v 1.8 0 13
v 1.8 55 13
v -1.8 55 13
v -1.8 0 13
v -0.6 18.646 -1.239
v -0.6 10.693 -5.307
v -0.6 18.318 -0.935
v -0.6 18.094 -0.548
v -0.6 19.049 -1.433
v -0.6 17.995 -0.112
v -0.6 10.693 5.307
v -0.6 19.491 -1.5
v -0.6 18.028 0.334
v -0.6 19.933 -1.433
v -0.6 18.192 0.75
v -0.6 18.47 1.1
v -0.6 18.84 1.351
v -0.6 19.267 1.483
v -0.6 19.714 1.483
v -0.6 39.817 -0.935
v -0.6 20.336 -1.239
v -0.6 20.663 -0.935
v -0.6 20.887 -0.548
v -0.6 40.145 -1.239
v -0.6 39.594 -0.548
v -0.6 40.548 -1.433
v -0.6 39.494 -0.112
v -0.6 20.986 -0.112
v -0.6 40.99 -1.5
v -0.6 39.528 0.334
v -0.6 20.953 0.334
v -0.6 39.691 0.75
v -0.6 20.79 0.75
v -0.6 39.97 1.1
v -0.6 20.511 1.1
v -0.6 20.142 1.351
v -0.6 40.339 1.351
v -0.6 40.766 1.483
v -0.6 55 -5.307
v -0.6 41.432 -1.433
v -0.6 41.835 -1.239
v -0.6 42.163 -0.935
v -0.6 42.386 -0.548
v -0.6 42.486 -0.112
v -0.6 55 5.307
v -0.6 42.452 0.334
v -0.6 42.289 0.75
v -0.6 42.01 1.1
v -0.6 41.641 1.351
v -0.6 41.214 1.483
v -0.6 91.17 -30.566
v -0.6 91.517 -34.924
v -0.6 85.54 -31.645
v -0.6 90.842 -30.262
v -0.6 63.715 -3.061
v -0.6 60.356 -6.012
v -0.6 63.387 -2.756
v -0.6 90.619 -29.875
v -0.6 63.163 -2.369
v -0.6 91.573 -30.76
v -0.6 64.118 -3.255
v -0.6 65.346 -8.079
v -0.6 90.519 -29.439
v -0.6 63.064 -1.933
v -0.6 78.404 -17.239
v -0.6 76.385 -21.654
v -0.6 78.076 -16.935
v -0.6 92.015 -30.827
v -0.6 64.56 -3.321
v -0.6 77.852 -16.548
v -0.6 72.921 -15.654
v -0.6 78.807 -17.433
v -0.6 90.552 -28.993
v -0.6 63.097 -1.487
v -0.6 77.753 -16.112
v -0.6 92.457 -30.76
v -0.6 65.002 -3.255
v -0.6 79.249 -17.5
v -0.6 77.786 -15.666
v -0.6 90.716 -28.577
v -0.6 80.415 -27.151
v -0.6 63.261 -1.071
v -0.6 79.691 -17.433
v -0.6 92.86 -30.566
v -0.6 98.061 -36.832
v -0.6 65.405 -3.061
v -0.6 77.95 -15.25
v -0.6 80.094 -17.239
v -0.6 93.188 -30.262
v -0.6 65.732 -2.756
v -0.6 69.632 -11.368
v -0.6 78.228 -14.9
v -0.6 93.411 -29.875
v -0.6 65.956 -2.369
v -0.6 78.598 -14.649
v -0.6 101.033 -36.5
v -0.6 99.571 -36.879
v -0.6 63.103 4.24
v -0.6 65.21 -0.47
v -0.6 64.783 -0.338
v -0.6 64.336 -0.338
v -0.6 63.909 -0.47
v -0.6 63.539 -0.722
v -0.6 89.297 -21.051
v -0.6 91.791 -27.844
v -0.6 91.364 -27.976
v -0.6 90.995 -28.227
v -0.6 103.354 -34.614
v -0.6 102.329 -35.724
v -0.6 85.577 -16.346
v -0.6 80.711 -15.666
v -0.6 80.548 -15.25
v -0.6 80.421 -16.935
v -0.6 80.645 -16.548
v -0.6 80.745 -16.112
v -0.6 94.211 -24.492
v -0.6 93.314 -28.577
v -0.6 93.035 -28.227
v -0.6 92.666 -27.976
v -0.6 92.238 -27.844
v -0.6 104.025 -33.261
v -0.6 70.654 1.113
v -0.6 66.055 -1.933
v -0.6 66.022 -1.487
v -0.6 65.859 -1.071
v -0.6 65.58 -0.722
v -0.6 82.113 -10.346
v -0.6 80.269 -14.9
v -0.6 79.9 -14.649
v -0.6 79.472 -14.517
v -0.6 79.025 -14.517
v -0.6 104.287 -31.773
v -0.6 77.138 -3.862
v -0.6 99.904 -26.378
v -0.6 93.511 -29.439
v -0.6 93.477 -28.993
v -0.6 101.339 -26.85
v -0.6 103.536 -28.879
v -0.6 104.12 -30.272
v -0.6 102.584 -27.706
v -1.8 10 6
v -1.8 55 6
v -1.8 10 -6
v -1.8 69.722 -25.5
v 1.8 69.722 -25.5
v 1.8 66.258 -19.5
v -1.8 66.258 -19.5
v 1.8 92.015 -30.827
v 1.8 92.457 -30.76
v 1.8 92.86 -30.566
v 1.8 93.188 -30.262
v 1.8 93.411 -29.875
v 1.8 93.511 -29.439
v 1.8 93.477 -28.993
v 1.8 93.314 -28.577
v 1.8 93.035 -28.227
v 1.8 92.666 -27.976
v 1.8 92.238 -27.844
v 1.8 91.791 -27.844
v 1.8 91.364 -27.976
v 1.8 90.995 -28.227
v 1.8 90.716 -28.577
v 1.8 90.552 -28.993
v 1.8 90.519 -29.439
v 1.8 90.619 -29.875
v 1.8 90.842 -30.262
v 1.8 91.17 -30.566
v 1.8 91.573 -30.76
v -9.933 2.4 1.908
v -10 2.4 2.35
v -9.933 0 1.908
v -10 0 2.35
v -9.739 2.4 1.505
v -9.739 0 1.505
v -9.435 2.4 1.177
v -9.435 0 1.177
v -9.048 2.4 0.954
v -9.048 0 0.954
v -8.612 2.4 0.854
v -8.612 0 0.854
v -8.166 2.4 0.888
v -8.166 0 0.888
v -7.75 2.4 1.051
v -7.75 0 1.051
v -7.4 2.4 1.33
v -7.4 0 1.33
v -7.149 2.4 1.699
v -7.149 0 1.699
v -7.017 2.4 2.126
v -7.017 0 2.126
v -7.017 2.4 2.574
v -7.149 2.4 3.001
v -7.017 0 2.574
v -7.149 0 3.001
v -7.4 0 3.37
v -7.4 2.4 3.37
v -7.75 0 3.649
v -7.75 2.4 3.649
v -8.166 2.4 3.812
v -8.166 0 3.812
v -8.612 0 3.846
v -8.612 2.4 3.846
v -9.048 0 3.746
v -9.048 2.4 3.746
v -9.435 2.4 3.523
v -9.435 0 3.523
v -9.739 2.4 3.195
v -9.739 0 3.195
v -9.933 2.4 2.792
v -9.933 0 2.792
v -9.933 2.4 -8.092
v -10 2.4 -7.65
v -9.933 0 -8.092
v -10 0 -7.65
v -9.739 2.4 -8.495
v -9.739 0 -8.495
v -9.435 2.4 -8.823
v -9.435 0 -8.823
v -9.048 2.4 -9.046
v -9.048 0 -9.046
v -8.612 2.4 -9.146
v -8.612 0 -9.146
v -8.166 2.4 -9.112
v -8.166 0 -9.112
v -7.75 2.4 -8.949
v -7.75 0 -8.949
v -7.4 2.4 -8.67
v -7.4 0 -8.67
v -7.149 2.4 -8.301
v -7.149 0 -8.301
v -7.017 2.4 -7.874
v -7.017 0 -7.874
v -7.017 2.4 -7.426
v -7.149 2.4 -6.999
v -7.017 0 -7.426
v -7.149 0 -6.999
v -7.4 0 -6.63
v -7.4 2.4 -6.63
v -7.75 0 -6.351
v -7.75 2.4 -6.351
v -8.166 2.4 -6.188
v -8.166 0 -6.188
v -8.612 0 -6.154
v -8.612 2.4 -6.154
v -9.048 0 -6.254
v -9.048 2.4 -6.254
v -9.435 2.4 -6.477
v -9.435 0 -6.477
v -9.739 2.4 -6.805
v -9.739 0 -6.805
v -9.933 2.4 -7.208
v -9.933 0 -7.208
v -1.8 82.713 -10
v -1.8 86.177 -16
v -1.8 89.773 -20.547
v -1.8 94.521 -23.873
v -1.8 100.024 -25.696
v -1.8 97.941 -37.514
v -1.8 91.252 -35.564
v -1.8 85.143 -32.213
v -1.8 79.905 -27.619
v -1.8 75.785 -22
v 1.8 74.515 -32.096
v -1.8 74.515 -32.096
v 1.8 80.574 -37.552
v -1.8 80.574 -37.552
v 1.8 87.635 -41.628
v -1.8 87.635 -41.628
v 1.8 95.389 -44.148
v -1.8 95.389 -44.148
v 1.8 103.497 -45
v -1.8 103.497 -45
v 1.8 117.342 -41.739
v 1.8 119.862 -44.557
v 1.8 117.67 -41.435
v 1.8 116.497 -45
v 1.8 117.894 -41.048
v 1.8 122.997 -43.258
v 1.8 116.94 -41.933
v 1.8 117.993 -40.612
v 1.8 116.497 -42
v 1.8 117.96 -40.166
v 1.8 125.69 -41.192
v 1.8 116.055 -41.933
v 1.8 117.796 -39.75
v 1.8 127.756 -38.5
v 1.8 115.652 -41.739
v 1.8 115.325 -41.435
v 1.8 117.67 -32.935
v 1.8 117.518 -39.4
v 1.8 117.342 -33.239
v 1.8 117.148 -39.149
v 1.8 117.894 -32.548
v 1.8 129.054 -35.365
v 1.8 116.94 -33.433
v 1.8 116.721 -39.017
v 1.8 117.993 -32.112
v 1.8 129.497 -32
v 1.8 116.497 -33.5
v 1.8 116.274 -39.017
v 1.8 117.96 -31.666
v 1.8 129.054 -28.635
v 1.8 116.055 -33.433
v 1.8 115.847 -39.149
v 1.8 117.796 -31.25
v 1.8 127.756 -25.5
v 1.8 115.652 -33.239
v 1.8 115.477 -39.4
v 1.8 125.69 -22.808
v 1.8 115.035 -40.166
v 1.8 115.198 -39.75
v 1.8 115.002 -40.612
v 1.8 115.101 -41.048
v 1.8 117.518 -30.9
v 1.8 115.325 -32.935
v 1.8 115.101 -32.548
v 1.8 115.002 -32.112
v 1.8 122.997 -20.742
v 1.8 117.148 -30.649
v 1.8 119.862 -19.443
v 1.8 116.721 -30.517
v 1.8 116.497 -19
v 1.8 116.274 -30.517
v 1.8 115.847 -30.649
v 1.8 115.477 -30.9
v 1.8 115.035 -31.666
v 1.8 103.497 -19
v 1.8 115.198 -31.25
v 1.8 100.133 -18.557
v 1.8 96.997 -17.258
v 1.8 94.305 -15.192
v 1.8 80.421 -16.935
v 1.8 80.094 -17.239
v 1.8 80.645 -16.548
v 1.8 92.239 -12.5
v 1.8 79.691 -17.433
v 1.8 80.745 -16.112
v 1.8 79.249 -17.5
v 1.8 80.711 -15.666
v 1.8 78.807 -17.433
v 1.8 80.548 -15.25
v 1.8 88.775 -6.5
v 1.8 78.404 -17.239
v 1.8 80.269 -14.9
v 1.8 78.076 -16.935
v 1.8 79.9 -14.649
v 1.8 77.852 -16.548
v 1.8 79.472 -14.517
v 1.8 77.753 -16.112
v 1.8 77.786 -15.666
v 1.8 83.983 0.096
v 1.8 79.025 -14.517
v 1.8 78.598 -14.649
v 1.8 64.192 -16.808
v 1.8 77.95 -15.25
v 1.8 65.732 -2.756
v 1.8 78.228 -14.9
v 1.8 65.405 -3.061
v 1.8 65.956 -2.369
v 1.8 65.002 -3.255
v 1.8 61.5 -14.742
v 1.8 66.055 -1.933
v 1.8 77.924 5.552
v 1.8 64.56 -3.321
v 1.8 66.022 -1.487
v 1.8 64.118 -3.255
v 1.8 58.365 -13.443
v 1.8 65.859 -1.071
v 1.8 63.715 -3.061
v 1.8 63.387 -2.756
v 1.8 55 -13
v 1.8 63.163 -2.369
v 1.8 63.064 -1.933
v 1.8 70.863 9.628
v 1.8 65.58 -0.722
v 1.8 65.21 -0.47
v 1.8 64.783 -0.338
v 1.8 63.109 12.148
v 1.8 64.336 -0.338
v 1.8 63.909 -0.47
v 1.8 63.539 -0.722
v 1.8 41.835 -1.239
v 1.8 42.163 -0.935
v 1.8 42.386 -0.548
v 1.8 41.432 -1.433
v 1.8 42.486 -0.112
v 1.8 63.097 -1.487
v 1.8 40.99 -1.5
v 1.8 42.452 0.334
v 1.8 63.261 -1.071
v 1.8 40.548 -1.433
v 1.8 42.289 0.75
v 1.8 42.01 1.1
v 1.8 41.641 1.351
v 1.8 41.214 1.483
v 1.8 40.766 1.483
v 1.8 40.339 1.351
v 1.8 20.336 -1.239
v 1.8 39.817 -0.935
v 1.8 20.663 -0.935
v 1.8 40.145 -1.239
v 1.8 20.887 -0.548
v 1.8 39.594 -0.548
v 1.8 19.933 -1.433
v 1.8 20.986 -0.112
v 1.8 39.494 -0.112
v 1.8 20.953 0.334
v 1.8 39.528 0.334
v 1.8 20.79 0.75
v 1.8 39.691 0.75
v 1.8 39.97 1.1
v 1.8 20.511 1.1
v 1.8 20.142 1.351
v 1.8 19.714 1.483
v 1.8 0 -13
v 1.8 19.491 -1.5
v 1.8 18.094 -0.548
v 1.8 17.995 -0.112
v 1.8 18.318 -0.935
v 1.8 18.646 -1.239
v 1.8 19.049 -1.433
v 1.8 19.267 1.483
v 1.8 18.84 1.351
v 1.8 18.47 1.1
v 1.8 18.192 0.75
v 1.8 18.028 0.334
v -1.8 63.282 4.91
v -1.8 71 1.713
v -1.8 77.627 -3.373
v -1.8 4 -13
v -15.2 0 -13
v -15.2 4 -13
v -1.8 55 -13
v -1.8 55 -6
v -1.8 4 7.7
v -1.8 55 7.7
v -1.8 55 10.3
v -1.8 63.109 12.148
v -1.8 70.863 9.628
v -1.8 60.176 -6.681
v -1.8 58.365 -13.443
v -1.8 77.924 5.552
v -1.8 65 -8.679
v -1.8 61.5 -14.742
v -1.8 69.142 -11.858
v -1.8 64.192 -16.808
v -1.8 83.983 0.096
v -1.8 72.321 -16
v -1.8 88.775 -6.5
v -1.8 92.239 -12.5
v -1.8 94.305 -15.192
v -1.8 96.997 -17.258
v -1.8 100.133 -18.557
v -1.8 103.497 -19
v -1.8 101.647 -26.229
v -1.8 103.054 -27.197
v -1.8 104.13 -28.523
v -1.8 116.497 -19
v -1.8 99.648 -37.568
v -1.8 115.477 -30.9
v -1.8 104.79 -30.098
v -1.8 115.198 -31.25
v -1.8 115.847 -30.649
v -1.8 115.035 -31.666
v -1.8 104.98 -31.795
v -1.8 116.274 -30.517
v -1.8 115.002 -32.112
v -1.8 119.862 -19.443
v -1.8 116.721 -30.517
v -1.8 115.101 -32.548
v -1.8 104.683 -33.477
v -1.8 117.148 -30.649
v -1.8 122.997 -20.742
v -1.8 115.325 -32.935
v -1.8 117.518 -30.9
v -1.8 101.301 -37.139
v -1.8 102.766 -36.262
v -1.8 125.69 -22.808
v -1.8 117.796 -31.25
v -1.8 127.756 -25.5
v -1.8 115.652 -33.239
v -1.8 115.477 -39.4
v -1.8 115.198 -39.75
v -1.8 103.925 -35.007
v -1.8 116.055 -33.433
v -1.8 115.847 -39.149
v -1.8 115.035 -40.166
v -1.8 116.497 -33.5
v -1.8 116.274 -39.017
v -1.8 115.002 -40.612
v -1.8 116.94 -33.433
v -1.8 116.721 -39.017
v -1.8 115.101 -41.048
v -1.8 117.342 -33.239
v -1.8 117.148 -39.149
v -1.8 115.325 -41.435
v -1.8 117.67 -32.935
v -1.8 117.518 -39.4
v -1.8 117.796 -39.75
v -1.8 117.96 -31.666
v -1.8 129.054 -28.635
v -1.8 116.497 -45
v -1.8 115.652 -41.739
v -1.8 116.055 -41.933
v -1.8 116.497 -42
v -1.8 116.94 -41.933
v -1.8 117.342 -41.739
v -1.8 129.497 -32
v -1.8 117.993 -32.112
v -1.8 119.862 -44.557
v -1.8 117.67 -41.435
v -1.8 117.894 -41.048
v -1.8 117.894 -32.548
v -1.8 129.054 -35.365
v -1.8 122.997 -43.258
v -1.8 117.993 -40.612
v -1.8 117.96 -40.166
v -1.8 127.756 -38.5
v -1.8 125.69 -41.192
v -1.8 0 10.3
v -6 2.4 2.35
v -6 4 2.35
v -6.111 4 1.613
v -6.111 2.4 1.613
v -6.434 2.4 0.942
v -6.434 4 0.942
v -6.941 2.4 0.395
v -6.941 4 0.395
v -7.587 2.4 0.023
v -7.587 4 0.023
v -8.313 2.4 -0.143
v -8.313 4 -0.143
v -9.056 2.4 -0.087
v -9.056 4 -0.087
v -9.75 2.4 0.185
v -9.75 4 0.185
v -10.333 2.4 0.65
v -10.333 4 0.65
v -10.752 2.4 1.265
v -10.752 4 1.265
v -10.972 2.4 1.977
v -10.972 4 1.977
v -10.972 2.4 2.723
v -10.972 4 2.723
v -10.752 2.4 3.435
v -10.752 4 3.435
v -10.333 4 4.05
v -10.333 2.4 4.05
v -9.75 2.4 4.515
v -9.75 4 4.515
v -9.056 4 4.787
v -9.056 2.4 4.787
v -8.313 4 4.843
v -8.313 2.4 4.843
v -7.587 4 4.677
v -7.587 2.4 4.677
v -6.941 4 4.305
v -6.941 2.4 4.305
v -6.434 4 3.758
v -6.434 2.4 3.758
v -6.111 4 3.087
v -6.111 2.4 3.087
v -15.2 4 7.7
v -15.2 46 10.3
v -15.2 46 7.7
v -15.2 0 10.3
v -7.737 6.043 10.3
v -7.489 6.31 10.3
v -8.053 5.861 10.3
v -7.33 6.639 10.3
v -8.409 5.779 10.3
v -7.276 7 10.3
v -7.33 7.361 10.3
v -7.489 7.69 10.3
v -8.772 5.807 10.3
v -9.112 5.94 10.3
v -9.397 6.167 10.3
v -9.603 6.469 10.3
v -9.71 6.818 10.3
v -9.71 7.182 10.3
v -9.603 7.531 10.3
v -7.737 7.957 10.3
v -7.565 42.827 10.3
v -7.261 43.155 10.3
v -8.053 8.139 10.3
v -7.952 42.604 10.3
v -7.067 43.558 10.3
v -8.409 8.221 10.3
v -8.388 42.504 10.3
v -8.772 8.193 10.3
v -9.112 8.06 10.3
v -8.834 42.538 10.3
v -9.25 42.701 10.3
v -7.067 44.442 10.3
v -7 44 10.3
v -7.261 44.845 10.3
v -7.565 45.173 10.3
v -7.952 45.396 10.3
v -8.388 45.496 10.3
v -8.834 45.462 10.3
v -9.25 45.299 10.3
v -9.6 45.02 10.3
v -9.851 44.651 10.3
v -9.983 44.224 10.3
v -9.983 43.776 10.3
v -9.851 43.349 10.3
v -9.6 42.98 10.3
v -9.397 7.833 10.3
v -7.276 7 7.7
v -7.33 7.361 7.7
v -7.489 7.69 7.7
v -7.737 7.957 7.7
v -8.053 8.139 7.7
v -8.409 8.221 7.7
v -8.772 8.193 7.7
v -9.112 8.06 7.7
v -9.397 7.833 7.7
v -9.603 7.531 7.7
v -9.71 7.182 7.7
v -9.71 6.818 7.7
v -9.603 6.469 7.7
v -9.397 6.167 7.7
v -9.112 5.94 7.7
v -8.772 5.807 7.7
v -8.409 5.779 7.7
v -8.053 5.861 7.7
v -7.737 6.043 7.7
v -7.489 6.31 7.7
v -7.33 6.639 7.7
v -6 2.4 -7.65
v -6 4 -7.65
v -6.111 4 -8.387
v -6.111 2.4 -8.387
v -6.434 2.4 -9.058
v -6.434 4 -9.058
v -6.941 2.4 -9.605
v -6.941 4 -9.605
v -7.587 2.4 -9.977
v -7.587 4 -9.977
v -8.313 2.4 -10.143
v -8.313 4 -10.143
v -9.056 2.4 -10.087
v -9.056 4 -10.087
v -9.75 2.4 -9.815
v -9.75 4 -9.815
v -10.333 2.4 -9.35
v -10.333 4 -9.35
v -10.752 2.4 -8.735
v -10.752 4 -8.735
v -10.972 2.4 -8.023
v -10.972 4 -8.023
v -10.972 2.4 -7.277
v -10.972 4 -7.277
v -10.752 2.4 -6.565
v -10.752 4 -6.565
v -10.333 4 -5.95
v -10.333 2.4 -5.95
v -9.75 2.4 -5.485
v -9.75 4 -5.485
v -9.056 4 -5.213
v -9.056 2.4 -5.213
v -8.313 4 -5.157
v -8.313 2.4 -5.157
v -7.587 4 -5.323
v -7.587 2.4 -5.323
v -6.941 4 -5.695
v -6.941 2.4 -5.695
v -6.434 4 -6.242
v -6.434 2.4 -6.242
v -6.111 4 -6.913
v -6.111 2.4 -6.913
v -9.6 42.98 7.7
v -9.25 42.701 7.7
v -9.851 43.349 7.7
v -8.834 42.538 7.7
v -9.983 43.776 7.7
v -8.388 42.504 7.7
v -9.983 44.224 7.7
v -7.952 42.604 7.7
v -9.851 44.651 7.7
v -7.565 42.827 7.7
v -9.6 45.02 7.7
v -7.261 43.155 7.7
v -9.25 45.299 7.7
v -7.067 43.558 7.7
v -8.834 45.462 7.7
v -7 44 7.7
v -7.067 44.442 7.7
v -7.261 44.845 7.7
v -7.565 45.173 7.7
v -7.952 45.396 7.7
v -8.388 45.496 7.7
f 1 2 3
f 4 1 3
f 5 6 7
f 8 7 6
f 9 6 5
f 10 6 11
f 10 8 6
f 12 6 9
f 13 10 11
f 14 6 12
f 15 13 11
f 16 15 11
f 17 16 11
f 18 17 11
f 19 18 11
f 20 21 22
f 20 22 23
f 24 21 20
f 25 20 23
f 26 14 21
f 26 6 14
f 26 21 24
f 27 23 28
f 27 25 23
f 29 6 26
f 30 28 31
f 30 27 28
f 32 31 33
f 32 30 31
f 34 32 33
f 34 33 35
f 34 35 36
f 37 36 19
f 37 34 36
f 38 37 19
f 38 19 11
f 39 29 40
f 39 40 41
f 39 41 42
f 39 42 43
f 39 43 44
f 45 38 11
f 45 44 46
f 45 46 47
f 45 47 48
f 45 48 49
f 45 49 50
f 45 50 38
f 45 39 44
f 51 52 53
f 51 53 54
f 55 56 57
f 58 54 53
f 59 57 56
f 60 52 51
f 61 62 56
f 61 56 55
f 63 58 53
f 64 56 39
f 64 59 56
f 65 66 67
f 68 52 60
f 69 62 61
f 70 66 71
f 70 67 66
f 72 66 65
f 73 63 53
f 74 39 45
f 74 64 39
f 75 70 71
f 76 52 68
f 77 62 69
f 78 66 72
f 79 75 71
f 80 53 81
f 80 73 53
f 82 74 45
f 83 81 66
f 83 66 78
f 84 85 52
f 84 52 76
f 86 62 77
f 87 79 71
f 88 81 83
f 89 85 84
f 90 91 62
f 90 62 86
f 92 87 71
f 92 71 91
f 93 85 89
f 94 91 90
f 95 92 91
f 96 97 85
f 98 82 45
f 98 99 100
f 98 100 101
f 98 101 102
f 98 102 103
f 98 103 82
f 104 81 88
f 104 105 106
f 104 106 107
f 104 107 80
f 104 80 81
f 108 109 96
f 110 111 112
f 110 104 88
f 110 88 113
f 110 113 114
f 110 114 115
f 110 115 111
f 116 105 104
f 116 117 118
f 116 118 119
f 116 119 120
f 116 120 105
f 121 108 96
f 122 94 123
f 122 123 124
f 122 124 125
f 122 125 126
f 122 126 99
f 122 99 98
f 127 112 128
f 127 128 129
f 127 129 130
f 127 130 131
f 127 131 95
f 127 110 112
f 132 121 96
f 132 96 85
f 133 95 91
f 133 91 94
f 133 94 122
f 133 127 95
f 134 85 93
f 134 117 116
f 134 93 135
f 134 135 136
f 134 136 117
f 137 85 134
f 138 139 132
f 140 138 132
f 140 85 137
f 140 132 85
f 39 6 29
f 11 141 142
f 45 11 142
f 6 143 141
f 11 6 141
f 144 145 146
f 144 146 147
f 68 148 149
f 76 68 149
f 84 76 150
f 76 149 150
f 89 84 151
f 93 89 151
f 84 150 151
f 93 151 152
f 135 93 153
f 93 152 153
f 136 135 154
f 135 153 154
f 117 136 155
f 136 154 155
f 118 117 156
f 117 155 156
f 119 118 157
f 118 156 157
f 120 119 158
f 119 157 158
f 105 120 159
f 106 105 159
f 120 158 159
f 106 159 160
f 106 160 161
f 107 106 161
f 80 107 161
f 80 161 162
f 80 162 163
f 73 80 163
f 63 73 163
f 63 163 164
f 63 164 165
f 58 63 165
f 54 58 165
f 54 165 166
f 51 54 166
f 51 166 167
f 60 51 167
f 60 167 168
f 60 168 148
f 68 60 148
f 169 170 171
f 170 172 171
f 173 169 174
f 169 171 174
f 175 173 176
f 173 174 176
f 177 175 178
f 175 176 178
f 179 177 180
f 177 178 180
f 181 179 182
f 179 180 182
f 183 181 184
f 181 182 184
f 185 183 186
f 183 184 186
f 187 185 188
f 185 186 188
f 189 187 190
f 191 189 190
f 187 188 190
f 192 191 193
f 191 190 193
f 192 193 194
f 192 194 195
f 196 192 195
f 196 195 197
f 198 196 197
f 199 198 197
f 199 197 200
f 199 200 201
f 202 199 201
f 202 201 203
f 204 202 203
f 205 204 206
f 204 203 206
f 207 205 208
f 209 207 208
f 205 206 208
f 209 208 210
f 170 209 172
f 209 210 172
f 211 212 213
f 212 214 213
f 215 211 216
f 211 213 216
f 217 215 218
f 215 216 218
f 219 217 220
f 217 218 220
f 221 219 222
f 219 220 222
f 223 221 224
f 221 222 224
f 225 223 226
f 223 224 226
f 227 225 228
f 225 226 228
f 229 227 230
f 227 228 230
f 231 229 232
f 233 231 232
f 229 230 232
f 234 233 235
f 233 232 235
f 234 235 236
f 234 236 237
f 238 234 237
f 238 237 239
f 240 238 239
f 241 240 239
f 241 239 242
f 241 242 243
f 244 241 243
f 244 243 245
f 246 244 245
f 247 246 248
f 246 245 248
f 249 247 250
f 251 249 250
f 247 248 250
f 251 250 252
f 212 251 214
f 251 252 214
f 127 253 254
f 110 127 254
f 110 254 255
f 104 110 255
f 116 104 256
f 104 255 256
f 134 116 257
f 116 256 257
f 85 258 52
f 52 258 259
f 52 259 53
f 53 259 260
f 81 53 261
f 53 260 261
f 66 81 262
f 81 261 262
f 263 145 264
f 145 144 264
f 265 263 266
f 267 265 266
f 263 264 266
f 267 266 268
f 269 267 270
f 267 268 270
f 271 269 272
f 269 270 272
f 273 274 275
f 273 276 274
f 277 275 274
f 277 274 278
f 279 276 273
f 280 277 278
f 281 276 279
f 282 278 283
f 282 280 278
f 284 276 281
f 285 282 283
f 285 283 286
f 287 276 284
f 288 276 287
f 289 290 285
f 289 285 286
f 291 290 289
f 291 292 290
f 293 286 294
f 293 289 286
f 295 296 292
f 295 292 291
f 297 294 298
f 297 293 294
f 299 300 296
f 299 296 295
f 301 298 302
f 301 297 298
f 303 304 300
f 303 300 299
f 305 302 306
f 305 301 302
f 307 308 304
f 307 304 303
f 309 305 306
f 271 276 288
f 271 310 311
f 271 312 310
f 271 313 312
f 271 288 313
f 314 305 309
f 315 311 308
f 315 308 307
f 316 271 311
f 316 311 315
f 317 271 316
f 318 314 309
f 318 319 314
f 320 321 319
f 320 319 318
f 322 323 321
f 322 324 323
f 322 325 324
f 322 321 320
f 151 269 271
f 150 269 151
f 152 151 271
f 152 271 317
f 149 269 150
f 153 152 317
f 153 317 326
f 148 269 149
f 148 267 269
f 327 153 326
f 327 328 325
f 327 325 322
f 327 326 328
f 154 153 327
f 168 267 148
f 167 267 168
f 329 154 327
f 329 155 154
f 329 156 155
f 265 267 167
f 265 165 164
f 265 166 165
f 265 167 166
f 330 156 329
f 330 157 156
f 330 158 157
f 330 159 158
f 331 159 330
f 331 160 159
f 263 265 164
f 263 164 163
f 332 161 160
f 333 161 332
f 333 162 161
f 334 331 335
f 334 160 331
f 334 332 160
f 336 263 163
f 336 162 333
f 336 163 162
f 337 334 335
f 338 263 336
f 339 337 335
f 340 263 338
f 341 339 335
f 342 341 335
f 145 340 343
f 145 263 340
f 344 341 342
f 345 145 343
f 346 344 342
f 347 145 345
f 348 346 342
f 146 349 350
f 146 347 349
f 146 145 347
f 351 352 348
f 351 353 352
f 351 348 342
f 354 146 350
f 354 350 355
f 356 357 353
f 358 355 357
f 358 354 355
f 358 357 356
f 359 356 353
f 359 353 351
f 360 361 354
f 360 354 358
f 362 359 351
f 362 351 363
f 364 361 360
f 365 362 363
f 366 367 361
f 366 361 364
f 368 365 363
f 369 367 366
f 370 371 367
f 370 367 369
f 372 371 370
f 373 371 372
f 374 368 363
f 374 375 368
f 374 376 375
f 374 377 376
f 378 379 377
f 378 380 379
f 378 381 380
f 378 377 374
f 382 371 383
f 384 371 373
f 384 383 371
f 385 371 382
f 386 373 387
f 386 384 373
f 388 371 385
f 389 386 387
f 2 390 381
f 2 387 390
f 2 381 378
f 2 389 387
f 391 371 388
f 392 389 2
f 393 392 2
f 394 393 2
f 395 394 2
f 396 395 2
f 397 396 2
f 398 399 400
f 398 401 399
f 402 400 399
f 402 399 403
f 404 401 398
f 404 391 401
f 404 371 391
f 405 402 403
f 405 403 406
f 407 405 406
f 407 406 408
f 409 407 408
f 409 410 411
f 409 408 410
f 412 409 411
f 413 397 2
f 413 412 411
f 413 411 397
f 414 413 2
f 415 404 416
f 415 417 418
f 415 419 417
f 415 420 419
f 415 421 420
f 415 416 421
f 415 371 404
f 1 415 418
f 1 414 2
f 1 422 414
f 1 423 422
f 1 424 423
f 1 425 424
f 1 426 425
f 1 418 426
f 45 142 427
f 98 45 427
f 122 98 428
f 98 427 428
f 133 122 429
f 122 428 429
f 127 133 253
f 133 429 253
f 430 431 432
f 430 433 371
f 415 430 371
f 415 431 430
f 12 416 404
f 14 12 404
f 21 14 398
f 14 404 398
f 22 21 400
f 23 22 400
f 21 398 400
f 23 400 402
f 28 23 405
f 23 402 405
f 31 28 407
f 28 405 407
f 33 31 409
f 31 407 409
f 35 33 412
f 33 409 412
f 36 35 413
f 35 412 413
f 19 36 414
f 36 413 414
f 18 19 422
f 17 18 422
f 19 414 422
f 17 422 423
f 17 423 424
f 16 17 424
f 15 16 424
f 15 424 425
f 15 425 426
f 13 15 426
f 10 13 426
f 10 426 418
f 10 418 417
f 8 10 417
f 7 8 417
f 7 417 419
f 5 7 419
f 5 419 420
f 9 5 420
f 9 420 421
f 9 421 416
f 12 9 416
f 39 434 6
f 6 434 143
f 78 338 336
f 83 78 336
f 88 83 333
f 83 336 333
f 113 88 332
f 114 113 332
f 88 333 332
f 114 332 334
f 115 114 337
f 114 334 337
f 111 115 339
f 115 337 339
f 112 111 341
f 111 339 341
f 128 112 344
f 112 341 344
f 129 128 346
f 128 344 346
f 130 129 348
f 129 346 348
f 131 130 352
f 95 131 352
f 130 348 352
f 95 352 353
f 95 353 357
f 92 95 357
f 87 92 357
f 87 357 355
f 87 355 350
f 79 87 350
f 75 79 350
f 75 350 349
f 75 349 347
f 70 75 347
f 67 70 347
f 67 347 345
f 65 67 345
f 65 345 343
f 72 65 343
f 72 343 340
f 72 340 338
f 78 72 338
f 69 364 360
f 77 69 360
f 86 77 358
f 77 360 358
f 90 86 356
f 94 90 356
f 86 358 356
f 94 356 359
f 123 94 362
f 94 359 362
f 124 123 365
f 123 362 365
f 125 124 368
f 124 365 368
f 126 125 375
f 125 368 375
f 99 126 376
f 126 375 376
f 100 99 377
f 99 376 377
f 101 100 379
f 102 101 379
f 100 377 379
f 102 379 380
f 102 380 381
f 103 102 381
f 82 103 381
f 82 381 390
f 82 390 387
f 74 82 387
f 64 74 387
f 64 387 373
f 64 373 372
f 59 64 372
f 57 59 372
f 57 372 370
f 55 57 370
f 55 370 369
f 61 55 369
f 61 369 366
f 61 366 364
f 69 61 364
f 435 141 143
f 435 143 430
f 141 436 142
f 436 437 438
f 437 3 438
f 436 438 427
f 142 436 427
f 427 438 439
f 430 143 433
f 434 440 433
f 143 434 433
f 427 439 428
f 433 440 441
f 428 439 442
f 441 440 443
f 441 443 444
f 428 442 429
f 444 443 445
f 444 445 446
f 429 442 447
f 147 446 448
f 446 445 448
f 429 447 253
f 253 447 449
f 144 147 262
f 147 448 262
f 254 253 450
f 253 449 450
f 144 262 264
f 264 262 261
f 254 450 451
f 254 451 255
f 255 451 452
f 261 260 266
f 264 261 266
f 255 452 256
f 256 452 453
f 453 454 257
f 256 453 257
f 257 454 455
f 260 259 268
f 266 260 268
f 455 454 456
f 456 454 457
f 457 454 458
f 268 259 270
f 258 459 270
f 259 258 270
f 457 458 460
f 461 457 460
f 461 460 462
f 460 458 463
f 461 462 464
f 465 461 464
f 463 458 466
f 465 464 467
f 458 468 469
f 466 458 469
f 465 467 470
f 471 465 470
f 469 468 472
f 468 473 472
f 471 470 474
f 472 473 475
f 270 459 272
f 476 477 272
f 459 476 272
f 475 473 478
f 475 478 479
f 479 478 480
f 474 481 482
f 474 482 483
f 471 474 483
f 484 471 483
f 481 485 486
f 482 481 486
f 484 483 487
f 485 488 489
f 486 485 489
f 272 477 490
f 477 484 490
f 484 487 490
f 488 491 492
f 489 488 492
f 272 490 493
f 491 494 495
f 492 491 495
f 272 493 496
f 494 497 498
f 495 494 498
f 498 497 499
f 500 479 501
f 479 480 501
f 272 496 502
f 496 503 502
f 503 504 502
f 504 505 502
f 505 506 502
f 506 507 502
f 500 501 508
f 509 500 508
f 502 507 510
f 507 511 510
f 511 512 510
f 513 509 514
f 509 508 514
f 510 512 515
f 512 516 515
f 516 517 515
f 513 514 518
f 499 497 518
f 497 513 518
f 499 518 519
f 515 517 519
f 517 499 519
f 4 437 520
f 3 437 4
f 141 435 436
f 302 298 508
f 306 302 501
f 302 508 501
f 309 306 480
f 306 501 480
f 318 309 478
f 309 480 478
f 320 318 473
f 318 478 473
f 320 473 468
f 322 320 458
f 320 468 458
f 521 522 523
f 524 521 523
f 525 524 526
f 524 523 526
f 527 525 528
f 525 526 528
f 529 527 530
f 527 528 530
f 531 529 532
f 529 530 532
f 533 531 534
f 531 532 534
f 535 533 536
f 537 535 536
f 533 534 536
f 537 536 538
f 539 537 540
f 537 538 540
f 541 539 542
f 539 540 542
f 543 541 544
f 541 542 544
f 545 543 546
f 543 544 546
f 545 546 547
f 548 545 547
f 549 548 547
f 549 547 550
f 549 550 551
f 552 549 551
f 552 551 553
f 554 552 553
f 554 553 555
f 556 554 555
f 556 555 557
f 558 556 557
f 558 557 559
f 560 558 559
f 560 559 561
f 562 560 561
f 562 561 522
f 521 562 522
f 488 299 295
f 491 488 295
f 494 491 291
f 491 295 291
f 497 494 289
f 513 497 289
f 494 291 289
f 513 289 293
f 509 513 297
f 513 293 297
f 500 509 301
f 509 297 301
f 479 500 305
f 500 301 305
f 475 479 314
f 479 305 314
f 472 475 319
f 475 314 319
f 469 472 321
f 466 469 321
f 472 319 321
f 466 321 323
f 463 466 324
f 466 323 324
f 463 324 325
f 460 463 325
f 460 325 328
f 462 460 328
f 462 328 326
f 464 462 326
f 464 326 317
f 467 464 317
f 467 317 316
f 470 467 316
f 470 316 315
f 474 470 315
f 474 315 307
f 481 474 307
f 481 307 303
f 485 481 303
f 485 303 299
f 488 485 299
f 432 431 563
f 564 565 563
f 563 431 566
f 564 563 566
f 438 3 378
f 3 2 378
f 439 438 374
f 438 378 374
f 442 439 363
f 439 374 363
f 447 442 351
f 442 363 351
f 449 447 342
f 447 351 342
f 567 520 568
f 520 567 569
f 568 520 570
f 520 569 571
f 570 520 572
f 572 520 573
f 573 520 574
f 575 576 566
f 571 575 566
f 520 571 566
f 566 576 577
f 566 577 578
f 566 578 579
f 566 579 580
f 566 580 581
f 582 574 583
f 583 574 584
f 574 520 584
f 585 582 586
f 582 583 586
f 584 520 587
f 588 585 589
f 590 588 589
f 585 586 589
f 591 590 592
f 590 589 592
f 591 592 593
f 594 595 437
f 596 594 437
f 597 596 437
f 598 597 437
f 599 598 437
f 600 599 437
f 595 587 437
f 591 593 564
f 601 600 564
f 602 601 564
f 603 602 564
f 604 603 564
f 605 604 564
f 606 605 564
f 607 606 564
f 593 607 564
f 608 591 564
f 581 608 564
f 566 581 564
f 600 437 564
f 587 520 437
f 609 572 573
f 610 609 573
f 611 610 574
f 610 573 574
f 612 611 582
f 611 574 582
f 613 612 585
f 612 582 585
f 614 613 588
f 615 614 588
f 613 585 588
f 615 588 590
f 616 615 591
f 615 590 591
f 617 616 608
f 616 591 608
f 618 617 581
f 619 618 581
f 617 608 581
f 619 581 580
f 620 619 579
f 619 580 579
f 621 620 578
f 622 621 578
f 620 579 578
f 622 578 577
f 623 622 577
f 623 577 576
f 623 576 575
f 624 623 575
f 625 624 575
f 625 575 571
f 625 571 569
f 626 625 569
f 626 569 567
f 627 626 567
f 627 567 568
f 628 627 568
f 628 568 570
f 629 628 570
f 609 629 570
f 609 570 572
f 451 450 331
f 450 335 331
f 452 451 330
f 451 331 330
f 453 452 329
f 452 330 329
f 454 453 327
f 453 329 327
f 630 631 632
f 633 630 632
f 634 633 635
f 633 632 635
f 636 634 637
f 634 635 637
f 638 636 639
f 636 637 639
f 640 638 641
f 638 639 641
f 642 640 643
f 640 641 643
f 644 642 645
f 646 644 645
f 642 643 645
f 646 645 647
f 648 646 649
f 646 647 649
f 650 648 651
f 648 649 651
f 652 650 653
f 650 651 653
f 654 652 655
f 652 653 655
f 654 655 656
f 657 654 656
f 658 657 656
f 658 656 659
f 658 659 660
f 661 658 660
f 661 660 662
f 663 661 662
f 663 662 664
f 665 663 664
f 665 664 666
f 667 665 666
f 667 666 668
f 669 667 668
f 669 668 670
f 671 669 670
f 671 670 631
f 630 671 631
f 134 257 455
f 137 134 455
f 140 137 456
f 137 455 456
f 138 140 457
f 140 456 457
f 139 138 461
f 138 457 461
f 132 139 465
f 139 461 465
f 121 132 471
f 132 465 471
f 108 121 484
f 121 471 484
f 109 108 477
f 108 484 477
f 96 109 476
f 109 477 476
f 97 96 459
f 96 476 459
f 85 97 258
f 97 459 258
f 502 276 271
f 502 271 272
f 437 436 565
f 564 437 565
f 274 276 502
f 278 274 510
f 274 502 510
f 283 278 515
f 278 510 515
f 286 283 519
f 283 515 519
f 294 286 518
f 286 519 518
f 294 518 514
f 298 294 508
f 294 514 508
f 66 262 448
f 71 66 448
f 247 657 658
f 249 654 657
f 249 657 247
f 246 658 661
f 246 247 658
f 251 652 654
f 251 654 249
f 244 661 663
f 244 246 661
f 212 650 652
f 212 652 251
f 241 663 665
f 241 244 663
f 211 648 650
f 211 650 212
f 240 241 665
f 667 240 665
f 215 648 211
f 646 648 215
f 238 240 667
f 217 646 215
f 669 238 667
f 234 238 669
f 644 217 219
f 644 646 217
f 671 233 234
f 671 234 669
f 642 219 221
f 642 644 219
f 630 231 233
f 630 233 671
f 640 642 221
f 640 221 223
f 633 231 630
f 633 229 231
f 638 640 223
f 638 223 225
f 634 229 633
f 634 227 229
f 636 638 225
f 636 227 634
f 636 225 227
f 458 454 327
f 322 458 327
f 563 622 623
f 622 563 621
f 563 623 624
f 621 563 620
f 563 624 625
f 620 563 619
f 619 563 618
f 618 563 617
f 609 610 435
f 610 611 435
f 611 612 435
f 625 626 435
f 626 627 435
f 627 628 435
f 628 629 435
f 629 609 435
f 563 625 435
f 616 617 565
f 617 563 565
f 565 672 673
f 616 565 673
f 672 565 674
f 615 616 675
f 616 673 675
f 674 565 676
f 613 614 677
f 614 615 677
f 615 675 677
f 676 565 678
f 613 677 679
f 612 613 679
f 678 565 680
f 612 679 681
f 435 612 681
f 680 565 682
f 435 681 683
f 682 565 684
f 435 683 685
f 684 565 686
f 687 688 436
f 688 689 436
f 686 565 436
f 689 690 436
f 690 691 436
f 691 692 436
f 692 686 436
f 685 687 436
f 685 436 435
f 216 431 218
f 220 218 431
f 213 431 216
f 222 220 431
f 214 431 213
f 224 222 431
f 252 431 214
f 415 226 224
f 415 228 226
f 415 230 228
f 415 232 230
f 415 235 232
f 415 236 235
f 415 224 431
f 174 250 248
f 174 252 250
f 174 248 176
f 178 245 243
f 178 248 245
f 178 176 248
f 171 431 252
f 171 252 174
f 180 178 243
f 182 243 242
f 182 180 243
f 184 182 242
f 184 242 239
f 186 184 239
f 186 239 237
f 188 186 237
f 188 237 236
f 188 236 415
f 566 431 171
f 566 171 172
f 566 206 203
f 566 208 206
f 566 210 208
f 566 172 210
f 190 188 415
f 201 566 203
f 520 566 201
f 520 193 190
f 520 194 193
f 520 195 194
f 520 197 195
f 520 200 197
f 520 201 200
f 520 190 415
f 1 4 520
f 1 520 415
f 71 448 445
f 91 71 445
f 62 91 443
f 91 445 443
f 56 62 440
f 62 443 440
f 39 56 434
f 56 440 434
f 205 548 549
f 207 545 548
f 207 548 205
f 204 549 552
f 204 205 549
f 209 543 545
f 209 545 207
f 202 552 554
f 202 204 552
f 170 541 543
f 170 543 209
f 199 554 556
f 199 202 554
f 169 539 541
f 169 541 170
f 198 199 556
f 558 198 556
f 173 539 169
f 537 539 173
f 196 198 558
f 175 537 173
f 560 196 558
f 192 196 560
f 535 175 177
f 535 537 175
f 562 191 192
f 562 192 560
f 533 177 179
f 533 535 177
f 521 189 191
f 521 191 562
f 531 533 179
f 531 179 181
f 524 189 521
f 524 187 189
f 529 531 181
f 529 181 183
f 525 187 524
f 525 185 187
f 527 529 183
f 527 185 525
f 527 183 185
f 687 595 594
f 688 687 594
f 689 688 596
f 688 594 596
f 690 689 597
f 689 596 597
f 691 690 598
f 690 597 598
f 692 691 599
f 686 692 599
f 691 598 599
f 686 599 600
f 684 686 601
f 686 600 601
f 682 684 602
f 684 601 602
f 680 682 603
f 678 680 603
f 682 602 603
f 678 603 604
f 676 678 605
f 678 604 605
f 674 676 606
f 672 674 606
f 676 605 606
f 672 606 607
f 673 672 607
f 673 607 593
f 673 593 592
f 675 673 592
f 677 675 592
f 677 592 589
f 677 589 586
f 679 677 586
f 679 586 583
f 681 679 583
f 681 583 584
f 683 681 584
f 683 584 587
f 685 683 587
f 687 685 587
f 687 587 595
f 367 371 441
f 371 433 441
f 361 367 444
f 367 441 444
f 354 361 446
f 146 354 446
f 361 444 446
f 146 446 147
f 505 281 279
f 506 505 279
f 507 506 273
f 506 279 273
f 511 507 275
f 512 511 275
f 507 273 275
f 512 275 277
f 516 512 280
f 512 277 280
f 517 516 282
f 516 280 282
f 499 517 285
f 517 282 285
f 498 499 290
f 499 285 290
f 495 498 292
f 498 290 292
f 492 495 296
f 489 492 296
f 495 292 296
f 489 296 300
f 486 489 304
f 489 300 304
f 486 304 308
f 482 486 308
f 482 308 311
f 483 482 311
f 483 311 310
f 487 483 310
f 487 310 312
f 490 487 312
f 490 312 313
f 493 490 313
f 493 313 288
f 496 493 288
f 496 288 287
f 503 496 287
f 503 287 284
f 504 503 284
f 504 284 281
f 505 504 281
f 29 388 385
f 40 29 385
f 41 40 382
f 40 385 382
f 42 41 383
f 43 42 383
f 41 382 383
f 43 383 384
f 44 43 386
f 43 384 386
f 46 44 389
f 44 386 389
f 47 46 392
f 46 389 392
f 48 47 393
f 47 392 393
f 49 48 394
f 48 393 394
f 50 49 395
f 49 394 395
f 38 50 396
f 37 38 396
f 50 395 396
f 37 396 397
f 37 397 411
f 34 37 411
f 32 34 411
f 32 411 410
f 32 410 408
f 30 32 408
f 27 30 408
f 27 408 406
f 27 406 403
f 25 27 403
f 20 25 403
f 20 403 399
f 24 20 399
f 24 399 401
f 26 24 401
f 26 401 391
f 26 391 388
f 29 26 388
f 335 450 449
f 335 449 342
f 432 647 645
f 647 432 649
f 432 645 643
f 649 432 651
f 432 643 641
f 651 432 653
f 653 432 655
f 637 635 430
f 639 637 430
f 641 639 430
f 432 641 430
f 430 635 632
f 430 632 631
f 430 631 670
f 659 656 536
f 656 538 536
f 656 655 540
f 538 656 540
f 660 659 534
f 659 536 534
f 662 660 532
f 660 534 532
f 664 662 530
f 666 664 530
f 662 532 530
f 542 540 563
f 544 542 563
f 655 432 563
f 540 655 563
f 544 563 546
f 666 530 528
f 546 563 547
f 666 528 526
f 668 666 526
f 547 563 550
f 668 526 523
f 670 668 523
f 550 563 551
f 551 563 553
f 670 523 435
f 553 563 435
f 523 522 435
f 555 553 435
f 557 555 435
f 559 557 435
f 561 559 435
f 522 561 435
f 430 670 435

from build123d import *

# Parameters (mm, degrees)
SKETCH_2_W                = 3.6
SKETCH_2_H                = 26
SKETCH_3_W                = 17
SKETCH_3_H                = 33
EXTRUDE_1_DEPTH           = 4
RIB_START                 = -1.3
RIB_1_DEPTH               = 2.6
SKETCH_5_R                = 1.5
SKETCH_5_R_2              = 1.224086187
CUT_EXTRUDE_1_DEPTH       = 4
CUT_EXTRUDE_2_DEPTH       = 4
SKETCH_7_R                = 1.5
CUT_EXTRUDE_3_DEPTH       = 4
CUT_EXTRUDE_4_DEPTH       = 1.2
CUT_EXTRUDE_4_DRAFT       = -30
HOLE_WIZARD_1_D           = 3
HOLE_WIZARD_1_CBORE_D     = 5
HOLE_WIZARD_1_CBORE_DEPTH = 1.6
CUT_EXTRUDE_6_DEPTH       = 135.185107528
SKETCH_25_R               = 1.5
CUT_EXTRUDE_8_DEPTH       = 139.143340278


# Read off the part's stored shape, not the designer's step: 筋1
with BuildPart() as part:
    # 扫描1: sweep along a path in 草图1
    with BuildLine(Plane(origin=(0, 0, 0), x_dir=(0, 0, -1), z_dir=(1, 0, 0))) as sweep_1_path:
        Line((0, 0), (0, 55))
        ThreePointArc((0, 55), (3.483339502, 68), (13, 77.516660498))
        Line((13, 77.516660498), (19, 80.980762114))
        ThreePointArc((19, 80.980762114), (28.516660498, 90.497422612), (32, 103.497422612))
        Line((32, 103.497422612), (32, 129.497422612))
    # 草图2 → 扫描1 (sweep)
    with BuildSketch(Plane(origin=(0, 0, 0), x_dir=(1, 0, 0), z_dir=(0, 1, 0))):
        Rectangle(SKETCH_2_W, SKETCH_2_H)
    sweep(path=sweep_1_path.line)

    # 草图3 → 凸台-拉伸1 (add)
    with BuildSketch(Plane.XZ):
        with Locations((-6.7, 3.5)):
            Rectangle(SKETCH_3_W, SKETCH_3_H)
    extrude(amount=-EXTRUDE_1_DEPTH)

    # 筋1 outline → 筋1 (add)
    with BuildSketch(Plane.XY.offset(9).offset(RIB_START)):
        Polygon((-1.8, 55), (-15.2, 46), (-15.2, 4), (-1.8, 4), align=None)
    extrude(amount=RIB_1_DEPTH)

    # 草图5 → 切除-拉伸1 (cut)
    with BuildSketch(Plane.XY.offset(10.3)):
        with Locations((-8.5, 44)):
            Circle(SKETCH_5_R)
        with Locations((-8.5, 7)):
            Circle(SKETCH_5_R_2)
    extrude(amount=-CUT_EXTRUDE_1_DEPTH, mode=Mode.SUBTRACT)

    # 草图6 → 切除-拉伸2 (cut)
    with BuildSketch(Plane.ZY.offset(1.8)):
        with BuildLine():
            Line((-45, 129.497422612), (-45, 116.497422612))
            ThreePointArc((-45, 116.497422612), (-41.192388155, 125.689810767), (-32, 129.497422612))
            Line((-32, 129.497422612), (-45, 129.497422612))
        make_face()
        with BuildLine():
            ThreePointArc((-32, 129.497422612), (-22.807611845, 125.689810767), (-19, 116.497422612))
            Line((-19, 116.497422612), (-19, 129.497422612))
            Line((-19, 129.497422612), (-32, 129.497422612))
        make_face()
    extrude(amount=-CUT_EXTRUDE_2_DEPTH, mode=Mode.SUBTRACT)

    # 草图7 → 切除-拉伸3 (cut)
    with BuildSketch(Plane(origin=(1.8, 0, 0), x_dir=(0, 0, -1), z_dir=(1, 0, 0))):
        with Locations((32, 116.497422612)):
            Circle(SKETCH_7_R)
        with Locations((40.5, 116.497422612)):
            Circle(SKETCH_7_R)
    extrude(amount=-CUT_EXTRUDE_3_DEPTH, mode=Mode.SUBTRACT)


with BuildPart() as cut_extrude_4_tool:
    # 草图8 → 切除-拉伸4 (with draft: the straight prism first)
    with BuildSketch(Plane.ZY.offset(1.8)):
        with BuildLine():
            Line((6, 10), (6, 55))
            ThreePointArc((6, 55), (1.712812921, 71), (-10, 82.712812921))
            Line((-10, 82.712812921), (-16, 86.176914536))
            ThreePointArc((-16, 86.176914536), (-22.383040886, 92.025893885), (-25.69615506, 100.024459059))
            ThreePointArc((-25.69615506, 100.024459059), (-32.646890644, 104.891416511), (-37.513848096, 97.940680927))
            ThreePointArc((-37.513848096, 97.940680927), (-32.212865417, 85.142976649), (-22, 75.784609691))
            Line((-22, 75.784609691), (-16, 72.320508076))
            ThreePointArc((-16, 72.320508076), (-8.679491924, 65), (-6, 55))
            Line((-6, 55), (-6, 10))
            Line((-6, 10), (6, 10))
        make_face()
    extrude(amount=-CUT_EXTRUDE_4_DEPTH)
    # 切除-拉伸4: the draft: its side faces are tilted about the plane it starts from
    cut_extrude_4_sides = [cut_extrude_4_tool.faces().sort_by_distance(p)[0] for p in [
        (-1.2, 32.5, 6),
        (-1.2, 71, 1.712812921),
        (-1.2, 84.444863729, -13),
        (-1.2, 92.025893885, -22.383040886),
        (-1.2, 104.891416511, -32.646890644),
        (-1.2, 85.142976649, -32.212865417),
        (-1.2, 74.052558883, -19),
        (-1.2, 65, -8.679491924),
        (-1.2, 32.5, -6),
        (-1.2, 10, 0),
    ]]
    draft(cut_extrude_4_sides, Plane.ZY.offset(1.8), CUT_EXTRUDE_4_DRAFT)


with BuildPart() as part_1:
    add(part.part)

    # 切除-拉伸4: cut by cut_extrude_4_tool
    add(cut_extrude_4_tool.part, mode=Mode.SUBTRACT)

    # 孔1 (through all)
    with Locations(Plane(origin=(0, 4, 0), x_dir=(1, 0, 0), z_dir=(0, 1, 0))):
        with Locations((-8.5, 7.65), (-8.5, -2.35)):
            CounterBoreHole(HOLE_WIZARD_1_D / 2, HOLE_WIZARD_1_CBORE_D / 2, HOLE_WIZARD_1_CBORE_DEPTH)

    # 草图18 → 切除-拉伸6 (cut, through all)
    with BuildSketch(Plane(origin=(0, 4, 0), x_dir=(1, 0, 0), z_dir=(0, 1, 0))):
        Polygon((-1.8, -13), (-1.8, -10.3), (-15.2, -10.3), (-15.2, -20), (1.8, -20), (1.8, -13), align=None)
    extrude(amount=-CUT_EXTRUDE_6_DEPTH, mode=Mode.SUBTRACT)

    # 草图25 → 切除-拉伸8 (cut, through all)
    with BuildSketch(Plane(origin=(1.8, 0, 0), x_dir=(0, 0, -1), z_dir=(1, 0, 0))):
        with Locations((0, 19.490691587)):
            Circle(SKETCH_25_R)
    cut_extrude_8 = extrude(amount=-CUT_EXTRUDE_8_DEPTH, mode=Mode.SUBTRACT)

    # 草图阵列1: 切除-拉伸8 at 4 more places
    with Locations((0, 21.499351, 0), (0, 45.068964, -1.821229), (0, 72.524124, -29.327017), (0, 59.75802, -16)):
        add(cut_extrude_8, mode=Mode.SUBTRACT)


solid = part_1.part
